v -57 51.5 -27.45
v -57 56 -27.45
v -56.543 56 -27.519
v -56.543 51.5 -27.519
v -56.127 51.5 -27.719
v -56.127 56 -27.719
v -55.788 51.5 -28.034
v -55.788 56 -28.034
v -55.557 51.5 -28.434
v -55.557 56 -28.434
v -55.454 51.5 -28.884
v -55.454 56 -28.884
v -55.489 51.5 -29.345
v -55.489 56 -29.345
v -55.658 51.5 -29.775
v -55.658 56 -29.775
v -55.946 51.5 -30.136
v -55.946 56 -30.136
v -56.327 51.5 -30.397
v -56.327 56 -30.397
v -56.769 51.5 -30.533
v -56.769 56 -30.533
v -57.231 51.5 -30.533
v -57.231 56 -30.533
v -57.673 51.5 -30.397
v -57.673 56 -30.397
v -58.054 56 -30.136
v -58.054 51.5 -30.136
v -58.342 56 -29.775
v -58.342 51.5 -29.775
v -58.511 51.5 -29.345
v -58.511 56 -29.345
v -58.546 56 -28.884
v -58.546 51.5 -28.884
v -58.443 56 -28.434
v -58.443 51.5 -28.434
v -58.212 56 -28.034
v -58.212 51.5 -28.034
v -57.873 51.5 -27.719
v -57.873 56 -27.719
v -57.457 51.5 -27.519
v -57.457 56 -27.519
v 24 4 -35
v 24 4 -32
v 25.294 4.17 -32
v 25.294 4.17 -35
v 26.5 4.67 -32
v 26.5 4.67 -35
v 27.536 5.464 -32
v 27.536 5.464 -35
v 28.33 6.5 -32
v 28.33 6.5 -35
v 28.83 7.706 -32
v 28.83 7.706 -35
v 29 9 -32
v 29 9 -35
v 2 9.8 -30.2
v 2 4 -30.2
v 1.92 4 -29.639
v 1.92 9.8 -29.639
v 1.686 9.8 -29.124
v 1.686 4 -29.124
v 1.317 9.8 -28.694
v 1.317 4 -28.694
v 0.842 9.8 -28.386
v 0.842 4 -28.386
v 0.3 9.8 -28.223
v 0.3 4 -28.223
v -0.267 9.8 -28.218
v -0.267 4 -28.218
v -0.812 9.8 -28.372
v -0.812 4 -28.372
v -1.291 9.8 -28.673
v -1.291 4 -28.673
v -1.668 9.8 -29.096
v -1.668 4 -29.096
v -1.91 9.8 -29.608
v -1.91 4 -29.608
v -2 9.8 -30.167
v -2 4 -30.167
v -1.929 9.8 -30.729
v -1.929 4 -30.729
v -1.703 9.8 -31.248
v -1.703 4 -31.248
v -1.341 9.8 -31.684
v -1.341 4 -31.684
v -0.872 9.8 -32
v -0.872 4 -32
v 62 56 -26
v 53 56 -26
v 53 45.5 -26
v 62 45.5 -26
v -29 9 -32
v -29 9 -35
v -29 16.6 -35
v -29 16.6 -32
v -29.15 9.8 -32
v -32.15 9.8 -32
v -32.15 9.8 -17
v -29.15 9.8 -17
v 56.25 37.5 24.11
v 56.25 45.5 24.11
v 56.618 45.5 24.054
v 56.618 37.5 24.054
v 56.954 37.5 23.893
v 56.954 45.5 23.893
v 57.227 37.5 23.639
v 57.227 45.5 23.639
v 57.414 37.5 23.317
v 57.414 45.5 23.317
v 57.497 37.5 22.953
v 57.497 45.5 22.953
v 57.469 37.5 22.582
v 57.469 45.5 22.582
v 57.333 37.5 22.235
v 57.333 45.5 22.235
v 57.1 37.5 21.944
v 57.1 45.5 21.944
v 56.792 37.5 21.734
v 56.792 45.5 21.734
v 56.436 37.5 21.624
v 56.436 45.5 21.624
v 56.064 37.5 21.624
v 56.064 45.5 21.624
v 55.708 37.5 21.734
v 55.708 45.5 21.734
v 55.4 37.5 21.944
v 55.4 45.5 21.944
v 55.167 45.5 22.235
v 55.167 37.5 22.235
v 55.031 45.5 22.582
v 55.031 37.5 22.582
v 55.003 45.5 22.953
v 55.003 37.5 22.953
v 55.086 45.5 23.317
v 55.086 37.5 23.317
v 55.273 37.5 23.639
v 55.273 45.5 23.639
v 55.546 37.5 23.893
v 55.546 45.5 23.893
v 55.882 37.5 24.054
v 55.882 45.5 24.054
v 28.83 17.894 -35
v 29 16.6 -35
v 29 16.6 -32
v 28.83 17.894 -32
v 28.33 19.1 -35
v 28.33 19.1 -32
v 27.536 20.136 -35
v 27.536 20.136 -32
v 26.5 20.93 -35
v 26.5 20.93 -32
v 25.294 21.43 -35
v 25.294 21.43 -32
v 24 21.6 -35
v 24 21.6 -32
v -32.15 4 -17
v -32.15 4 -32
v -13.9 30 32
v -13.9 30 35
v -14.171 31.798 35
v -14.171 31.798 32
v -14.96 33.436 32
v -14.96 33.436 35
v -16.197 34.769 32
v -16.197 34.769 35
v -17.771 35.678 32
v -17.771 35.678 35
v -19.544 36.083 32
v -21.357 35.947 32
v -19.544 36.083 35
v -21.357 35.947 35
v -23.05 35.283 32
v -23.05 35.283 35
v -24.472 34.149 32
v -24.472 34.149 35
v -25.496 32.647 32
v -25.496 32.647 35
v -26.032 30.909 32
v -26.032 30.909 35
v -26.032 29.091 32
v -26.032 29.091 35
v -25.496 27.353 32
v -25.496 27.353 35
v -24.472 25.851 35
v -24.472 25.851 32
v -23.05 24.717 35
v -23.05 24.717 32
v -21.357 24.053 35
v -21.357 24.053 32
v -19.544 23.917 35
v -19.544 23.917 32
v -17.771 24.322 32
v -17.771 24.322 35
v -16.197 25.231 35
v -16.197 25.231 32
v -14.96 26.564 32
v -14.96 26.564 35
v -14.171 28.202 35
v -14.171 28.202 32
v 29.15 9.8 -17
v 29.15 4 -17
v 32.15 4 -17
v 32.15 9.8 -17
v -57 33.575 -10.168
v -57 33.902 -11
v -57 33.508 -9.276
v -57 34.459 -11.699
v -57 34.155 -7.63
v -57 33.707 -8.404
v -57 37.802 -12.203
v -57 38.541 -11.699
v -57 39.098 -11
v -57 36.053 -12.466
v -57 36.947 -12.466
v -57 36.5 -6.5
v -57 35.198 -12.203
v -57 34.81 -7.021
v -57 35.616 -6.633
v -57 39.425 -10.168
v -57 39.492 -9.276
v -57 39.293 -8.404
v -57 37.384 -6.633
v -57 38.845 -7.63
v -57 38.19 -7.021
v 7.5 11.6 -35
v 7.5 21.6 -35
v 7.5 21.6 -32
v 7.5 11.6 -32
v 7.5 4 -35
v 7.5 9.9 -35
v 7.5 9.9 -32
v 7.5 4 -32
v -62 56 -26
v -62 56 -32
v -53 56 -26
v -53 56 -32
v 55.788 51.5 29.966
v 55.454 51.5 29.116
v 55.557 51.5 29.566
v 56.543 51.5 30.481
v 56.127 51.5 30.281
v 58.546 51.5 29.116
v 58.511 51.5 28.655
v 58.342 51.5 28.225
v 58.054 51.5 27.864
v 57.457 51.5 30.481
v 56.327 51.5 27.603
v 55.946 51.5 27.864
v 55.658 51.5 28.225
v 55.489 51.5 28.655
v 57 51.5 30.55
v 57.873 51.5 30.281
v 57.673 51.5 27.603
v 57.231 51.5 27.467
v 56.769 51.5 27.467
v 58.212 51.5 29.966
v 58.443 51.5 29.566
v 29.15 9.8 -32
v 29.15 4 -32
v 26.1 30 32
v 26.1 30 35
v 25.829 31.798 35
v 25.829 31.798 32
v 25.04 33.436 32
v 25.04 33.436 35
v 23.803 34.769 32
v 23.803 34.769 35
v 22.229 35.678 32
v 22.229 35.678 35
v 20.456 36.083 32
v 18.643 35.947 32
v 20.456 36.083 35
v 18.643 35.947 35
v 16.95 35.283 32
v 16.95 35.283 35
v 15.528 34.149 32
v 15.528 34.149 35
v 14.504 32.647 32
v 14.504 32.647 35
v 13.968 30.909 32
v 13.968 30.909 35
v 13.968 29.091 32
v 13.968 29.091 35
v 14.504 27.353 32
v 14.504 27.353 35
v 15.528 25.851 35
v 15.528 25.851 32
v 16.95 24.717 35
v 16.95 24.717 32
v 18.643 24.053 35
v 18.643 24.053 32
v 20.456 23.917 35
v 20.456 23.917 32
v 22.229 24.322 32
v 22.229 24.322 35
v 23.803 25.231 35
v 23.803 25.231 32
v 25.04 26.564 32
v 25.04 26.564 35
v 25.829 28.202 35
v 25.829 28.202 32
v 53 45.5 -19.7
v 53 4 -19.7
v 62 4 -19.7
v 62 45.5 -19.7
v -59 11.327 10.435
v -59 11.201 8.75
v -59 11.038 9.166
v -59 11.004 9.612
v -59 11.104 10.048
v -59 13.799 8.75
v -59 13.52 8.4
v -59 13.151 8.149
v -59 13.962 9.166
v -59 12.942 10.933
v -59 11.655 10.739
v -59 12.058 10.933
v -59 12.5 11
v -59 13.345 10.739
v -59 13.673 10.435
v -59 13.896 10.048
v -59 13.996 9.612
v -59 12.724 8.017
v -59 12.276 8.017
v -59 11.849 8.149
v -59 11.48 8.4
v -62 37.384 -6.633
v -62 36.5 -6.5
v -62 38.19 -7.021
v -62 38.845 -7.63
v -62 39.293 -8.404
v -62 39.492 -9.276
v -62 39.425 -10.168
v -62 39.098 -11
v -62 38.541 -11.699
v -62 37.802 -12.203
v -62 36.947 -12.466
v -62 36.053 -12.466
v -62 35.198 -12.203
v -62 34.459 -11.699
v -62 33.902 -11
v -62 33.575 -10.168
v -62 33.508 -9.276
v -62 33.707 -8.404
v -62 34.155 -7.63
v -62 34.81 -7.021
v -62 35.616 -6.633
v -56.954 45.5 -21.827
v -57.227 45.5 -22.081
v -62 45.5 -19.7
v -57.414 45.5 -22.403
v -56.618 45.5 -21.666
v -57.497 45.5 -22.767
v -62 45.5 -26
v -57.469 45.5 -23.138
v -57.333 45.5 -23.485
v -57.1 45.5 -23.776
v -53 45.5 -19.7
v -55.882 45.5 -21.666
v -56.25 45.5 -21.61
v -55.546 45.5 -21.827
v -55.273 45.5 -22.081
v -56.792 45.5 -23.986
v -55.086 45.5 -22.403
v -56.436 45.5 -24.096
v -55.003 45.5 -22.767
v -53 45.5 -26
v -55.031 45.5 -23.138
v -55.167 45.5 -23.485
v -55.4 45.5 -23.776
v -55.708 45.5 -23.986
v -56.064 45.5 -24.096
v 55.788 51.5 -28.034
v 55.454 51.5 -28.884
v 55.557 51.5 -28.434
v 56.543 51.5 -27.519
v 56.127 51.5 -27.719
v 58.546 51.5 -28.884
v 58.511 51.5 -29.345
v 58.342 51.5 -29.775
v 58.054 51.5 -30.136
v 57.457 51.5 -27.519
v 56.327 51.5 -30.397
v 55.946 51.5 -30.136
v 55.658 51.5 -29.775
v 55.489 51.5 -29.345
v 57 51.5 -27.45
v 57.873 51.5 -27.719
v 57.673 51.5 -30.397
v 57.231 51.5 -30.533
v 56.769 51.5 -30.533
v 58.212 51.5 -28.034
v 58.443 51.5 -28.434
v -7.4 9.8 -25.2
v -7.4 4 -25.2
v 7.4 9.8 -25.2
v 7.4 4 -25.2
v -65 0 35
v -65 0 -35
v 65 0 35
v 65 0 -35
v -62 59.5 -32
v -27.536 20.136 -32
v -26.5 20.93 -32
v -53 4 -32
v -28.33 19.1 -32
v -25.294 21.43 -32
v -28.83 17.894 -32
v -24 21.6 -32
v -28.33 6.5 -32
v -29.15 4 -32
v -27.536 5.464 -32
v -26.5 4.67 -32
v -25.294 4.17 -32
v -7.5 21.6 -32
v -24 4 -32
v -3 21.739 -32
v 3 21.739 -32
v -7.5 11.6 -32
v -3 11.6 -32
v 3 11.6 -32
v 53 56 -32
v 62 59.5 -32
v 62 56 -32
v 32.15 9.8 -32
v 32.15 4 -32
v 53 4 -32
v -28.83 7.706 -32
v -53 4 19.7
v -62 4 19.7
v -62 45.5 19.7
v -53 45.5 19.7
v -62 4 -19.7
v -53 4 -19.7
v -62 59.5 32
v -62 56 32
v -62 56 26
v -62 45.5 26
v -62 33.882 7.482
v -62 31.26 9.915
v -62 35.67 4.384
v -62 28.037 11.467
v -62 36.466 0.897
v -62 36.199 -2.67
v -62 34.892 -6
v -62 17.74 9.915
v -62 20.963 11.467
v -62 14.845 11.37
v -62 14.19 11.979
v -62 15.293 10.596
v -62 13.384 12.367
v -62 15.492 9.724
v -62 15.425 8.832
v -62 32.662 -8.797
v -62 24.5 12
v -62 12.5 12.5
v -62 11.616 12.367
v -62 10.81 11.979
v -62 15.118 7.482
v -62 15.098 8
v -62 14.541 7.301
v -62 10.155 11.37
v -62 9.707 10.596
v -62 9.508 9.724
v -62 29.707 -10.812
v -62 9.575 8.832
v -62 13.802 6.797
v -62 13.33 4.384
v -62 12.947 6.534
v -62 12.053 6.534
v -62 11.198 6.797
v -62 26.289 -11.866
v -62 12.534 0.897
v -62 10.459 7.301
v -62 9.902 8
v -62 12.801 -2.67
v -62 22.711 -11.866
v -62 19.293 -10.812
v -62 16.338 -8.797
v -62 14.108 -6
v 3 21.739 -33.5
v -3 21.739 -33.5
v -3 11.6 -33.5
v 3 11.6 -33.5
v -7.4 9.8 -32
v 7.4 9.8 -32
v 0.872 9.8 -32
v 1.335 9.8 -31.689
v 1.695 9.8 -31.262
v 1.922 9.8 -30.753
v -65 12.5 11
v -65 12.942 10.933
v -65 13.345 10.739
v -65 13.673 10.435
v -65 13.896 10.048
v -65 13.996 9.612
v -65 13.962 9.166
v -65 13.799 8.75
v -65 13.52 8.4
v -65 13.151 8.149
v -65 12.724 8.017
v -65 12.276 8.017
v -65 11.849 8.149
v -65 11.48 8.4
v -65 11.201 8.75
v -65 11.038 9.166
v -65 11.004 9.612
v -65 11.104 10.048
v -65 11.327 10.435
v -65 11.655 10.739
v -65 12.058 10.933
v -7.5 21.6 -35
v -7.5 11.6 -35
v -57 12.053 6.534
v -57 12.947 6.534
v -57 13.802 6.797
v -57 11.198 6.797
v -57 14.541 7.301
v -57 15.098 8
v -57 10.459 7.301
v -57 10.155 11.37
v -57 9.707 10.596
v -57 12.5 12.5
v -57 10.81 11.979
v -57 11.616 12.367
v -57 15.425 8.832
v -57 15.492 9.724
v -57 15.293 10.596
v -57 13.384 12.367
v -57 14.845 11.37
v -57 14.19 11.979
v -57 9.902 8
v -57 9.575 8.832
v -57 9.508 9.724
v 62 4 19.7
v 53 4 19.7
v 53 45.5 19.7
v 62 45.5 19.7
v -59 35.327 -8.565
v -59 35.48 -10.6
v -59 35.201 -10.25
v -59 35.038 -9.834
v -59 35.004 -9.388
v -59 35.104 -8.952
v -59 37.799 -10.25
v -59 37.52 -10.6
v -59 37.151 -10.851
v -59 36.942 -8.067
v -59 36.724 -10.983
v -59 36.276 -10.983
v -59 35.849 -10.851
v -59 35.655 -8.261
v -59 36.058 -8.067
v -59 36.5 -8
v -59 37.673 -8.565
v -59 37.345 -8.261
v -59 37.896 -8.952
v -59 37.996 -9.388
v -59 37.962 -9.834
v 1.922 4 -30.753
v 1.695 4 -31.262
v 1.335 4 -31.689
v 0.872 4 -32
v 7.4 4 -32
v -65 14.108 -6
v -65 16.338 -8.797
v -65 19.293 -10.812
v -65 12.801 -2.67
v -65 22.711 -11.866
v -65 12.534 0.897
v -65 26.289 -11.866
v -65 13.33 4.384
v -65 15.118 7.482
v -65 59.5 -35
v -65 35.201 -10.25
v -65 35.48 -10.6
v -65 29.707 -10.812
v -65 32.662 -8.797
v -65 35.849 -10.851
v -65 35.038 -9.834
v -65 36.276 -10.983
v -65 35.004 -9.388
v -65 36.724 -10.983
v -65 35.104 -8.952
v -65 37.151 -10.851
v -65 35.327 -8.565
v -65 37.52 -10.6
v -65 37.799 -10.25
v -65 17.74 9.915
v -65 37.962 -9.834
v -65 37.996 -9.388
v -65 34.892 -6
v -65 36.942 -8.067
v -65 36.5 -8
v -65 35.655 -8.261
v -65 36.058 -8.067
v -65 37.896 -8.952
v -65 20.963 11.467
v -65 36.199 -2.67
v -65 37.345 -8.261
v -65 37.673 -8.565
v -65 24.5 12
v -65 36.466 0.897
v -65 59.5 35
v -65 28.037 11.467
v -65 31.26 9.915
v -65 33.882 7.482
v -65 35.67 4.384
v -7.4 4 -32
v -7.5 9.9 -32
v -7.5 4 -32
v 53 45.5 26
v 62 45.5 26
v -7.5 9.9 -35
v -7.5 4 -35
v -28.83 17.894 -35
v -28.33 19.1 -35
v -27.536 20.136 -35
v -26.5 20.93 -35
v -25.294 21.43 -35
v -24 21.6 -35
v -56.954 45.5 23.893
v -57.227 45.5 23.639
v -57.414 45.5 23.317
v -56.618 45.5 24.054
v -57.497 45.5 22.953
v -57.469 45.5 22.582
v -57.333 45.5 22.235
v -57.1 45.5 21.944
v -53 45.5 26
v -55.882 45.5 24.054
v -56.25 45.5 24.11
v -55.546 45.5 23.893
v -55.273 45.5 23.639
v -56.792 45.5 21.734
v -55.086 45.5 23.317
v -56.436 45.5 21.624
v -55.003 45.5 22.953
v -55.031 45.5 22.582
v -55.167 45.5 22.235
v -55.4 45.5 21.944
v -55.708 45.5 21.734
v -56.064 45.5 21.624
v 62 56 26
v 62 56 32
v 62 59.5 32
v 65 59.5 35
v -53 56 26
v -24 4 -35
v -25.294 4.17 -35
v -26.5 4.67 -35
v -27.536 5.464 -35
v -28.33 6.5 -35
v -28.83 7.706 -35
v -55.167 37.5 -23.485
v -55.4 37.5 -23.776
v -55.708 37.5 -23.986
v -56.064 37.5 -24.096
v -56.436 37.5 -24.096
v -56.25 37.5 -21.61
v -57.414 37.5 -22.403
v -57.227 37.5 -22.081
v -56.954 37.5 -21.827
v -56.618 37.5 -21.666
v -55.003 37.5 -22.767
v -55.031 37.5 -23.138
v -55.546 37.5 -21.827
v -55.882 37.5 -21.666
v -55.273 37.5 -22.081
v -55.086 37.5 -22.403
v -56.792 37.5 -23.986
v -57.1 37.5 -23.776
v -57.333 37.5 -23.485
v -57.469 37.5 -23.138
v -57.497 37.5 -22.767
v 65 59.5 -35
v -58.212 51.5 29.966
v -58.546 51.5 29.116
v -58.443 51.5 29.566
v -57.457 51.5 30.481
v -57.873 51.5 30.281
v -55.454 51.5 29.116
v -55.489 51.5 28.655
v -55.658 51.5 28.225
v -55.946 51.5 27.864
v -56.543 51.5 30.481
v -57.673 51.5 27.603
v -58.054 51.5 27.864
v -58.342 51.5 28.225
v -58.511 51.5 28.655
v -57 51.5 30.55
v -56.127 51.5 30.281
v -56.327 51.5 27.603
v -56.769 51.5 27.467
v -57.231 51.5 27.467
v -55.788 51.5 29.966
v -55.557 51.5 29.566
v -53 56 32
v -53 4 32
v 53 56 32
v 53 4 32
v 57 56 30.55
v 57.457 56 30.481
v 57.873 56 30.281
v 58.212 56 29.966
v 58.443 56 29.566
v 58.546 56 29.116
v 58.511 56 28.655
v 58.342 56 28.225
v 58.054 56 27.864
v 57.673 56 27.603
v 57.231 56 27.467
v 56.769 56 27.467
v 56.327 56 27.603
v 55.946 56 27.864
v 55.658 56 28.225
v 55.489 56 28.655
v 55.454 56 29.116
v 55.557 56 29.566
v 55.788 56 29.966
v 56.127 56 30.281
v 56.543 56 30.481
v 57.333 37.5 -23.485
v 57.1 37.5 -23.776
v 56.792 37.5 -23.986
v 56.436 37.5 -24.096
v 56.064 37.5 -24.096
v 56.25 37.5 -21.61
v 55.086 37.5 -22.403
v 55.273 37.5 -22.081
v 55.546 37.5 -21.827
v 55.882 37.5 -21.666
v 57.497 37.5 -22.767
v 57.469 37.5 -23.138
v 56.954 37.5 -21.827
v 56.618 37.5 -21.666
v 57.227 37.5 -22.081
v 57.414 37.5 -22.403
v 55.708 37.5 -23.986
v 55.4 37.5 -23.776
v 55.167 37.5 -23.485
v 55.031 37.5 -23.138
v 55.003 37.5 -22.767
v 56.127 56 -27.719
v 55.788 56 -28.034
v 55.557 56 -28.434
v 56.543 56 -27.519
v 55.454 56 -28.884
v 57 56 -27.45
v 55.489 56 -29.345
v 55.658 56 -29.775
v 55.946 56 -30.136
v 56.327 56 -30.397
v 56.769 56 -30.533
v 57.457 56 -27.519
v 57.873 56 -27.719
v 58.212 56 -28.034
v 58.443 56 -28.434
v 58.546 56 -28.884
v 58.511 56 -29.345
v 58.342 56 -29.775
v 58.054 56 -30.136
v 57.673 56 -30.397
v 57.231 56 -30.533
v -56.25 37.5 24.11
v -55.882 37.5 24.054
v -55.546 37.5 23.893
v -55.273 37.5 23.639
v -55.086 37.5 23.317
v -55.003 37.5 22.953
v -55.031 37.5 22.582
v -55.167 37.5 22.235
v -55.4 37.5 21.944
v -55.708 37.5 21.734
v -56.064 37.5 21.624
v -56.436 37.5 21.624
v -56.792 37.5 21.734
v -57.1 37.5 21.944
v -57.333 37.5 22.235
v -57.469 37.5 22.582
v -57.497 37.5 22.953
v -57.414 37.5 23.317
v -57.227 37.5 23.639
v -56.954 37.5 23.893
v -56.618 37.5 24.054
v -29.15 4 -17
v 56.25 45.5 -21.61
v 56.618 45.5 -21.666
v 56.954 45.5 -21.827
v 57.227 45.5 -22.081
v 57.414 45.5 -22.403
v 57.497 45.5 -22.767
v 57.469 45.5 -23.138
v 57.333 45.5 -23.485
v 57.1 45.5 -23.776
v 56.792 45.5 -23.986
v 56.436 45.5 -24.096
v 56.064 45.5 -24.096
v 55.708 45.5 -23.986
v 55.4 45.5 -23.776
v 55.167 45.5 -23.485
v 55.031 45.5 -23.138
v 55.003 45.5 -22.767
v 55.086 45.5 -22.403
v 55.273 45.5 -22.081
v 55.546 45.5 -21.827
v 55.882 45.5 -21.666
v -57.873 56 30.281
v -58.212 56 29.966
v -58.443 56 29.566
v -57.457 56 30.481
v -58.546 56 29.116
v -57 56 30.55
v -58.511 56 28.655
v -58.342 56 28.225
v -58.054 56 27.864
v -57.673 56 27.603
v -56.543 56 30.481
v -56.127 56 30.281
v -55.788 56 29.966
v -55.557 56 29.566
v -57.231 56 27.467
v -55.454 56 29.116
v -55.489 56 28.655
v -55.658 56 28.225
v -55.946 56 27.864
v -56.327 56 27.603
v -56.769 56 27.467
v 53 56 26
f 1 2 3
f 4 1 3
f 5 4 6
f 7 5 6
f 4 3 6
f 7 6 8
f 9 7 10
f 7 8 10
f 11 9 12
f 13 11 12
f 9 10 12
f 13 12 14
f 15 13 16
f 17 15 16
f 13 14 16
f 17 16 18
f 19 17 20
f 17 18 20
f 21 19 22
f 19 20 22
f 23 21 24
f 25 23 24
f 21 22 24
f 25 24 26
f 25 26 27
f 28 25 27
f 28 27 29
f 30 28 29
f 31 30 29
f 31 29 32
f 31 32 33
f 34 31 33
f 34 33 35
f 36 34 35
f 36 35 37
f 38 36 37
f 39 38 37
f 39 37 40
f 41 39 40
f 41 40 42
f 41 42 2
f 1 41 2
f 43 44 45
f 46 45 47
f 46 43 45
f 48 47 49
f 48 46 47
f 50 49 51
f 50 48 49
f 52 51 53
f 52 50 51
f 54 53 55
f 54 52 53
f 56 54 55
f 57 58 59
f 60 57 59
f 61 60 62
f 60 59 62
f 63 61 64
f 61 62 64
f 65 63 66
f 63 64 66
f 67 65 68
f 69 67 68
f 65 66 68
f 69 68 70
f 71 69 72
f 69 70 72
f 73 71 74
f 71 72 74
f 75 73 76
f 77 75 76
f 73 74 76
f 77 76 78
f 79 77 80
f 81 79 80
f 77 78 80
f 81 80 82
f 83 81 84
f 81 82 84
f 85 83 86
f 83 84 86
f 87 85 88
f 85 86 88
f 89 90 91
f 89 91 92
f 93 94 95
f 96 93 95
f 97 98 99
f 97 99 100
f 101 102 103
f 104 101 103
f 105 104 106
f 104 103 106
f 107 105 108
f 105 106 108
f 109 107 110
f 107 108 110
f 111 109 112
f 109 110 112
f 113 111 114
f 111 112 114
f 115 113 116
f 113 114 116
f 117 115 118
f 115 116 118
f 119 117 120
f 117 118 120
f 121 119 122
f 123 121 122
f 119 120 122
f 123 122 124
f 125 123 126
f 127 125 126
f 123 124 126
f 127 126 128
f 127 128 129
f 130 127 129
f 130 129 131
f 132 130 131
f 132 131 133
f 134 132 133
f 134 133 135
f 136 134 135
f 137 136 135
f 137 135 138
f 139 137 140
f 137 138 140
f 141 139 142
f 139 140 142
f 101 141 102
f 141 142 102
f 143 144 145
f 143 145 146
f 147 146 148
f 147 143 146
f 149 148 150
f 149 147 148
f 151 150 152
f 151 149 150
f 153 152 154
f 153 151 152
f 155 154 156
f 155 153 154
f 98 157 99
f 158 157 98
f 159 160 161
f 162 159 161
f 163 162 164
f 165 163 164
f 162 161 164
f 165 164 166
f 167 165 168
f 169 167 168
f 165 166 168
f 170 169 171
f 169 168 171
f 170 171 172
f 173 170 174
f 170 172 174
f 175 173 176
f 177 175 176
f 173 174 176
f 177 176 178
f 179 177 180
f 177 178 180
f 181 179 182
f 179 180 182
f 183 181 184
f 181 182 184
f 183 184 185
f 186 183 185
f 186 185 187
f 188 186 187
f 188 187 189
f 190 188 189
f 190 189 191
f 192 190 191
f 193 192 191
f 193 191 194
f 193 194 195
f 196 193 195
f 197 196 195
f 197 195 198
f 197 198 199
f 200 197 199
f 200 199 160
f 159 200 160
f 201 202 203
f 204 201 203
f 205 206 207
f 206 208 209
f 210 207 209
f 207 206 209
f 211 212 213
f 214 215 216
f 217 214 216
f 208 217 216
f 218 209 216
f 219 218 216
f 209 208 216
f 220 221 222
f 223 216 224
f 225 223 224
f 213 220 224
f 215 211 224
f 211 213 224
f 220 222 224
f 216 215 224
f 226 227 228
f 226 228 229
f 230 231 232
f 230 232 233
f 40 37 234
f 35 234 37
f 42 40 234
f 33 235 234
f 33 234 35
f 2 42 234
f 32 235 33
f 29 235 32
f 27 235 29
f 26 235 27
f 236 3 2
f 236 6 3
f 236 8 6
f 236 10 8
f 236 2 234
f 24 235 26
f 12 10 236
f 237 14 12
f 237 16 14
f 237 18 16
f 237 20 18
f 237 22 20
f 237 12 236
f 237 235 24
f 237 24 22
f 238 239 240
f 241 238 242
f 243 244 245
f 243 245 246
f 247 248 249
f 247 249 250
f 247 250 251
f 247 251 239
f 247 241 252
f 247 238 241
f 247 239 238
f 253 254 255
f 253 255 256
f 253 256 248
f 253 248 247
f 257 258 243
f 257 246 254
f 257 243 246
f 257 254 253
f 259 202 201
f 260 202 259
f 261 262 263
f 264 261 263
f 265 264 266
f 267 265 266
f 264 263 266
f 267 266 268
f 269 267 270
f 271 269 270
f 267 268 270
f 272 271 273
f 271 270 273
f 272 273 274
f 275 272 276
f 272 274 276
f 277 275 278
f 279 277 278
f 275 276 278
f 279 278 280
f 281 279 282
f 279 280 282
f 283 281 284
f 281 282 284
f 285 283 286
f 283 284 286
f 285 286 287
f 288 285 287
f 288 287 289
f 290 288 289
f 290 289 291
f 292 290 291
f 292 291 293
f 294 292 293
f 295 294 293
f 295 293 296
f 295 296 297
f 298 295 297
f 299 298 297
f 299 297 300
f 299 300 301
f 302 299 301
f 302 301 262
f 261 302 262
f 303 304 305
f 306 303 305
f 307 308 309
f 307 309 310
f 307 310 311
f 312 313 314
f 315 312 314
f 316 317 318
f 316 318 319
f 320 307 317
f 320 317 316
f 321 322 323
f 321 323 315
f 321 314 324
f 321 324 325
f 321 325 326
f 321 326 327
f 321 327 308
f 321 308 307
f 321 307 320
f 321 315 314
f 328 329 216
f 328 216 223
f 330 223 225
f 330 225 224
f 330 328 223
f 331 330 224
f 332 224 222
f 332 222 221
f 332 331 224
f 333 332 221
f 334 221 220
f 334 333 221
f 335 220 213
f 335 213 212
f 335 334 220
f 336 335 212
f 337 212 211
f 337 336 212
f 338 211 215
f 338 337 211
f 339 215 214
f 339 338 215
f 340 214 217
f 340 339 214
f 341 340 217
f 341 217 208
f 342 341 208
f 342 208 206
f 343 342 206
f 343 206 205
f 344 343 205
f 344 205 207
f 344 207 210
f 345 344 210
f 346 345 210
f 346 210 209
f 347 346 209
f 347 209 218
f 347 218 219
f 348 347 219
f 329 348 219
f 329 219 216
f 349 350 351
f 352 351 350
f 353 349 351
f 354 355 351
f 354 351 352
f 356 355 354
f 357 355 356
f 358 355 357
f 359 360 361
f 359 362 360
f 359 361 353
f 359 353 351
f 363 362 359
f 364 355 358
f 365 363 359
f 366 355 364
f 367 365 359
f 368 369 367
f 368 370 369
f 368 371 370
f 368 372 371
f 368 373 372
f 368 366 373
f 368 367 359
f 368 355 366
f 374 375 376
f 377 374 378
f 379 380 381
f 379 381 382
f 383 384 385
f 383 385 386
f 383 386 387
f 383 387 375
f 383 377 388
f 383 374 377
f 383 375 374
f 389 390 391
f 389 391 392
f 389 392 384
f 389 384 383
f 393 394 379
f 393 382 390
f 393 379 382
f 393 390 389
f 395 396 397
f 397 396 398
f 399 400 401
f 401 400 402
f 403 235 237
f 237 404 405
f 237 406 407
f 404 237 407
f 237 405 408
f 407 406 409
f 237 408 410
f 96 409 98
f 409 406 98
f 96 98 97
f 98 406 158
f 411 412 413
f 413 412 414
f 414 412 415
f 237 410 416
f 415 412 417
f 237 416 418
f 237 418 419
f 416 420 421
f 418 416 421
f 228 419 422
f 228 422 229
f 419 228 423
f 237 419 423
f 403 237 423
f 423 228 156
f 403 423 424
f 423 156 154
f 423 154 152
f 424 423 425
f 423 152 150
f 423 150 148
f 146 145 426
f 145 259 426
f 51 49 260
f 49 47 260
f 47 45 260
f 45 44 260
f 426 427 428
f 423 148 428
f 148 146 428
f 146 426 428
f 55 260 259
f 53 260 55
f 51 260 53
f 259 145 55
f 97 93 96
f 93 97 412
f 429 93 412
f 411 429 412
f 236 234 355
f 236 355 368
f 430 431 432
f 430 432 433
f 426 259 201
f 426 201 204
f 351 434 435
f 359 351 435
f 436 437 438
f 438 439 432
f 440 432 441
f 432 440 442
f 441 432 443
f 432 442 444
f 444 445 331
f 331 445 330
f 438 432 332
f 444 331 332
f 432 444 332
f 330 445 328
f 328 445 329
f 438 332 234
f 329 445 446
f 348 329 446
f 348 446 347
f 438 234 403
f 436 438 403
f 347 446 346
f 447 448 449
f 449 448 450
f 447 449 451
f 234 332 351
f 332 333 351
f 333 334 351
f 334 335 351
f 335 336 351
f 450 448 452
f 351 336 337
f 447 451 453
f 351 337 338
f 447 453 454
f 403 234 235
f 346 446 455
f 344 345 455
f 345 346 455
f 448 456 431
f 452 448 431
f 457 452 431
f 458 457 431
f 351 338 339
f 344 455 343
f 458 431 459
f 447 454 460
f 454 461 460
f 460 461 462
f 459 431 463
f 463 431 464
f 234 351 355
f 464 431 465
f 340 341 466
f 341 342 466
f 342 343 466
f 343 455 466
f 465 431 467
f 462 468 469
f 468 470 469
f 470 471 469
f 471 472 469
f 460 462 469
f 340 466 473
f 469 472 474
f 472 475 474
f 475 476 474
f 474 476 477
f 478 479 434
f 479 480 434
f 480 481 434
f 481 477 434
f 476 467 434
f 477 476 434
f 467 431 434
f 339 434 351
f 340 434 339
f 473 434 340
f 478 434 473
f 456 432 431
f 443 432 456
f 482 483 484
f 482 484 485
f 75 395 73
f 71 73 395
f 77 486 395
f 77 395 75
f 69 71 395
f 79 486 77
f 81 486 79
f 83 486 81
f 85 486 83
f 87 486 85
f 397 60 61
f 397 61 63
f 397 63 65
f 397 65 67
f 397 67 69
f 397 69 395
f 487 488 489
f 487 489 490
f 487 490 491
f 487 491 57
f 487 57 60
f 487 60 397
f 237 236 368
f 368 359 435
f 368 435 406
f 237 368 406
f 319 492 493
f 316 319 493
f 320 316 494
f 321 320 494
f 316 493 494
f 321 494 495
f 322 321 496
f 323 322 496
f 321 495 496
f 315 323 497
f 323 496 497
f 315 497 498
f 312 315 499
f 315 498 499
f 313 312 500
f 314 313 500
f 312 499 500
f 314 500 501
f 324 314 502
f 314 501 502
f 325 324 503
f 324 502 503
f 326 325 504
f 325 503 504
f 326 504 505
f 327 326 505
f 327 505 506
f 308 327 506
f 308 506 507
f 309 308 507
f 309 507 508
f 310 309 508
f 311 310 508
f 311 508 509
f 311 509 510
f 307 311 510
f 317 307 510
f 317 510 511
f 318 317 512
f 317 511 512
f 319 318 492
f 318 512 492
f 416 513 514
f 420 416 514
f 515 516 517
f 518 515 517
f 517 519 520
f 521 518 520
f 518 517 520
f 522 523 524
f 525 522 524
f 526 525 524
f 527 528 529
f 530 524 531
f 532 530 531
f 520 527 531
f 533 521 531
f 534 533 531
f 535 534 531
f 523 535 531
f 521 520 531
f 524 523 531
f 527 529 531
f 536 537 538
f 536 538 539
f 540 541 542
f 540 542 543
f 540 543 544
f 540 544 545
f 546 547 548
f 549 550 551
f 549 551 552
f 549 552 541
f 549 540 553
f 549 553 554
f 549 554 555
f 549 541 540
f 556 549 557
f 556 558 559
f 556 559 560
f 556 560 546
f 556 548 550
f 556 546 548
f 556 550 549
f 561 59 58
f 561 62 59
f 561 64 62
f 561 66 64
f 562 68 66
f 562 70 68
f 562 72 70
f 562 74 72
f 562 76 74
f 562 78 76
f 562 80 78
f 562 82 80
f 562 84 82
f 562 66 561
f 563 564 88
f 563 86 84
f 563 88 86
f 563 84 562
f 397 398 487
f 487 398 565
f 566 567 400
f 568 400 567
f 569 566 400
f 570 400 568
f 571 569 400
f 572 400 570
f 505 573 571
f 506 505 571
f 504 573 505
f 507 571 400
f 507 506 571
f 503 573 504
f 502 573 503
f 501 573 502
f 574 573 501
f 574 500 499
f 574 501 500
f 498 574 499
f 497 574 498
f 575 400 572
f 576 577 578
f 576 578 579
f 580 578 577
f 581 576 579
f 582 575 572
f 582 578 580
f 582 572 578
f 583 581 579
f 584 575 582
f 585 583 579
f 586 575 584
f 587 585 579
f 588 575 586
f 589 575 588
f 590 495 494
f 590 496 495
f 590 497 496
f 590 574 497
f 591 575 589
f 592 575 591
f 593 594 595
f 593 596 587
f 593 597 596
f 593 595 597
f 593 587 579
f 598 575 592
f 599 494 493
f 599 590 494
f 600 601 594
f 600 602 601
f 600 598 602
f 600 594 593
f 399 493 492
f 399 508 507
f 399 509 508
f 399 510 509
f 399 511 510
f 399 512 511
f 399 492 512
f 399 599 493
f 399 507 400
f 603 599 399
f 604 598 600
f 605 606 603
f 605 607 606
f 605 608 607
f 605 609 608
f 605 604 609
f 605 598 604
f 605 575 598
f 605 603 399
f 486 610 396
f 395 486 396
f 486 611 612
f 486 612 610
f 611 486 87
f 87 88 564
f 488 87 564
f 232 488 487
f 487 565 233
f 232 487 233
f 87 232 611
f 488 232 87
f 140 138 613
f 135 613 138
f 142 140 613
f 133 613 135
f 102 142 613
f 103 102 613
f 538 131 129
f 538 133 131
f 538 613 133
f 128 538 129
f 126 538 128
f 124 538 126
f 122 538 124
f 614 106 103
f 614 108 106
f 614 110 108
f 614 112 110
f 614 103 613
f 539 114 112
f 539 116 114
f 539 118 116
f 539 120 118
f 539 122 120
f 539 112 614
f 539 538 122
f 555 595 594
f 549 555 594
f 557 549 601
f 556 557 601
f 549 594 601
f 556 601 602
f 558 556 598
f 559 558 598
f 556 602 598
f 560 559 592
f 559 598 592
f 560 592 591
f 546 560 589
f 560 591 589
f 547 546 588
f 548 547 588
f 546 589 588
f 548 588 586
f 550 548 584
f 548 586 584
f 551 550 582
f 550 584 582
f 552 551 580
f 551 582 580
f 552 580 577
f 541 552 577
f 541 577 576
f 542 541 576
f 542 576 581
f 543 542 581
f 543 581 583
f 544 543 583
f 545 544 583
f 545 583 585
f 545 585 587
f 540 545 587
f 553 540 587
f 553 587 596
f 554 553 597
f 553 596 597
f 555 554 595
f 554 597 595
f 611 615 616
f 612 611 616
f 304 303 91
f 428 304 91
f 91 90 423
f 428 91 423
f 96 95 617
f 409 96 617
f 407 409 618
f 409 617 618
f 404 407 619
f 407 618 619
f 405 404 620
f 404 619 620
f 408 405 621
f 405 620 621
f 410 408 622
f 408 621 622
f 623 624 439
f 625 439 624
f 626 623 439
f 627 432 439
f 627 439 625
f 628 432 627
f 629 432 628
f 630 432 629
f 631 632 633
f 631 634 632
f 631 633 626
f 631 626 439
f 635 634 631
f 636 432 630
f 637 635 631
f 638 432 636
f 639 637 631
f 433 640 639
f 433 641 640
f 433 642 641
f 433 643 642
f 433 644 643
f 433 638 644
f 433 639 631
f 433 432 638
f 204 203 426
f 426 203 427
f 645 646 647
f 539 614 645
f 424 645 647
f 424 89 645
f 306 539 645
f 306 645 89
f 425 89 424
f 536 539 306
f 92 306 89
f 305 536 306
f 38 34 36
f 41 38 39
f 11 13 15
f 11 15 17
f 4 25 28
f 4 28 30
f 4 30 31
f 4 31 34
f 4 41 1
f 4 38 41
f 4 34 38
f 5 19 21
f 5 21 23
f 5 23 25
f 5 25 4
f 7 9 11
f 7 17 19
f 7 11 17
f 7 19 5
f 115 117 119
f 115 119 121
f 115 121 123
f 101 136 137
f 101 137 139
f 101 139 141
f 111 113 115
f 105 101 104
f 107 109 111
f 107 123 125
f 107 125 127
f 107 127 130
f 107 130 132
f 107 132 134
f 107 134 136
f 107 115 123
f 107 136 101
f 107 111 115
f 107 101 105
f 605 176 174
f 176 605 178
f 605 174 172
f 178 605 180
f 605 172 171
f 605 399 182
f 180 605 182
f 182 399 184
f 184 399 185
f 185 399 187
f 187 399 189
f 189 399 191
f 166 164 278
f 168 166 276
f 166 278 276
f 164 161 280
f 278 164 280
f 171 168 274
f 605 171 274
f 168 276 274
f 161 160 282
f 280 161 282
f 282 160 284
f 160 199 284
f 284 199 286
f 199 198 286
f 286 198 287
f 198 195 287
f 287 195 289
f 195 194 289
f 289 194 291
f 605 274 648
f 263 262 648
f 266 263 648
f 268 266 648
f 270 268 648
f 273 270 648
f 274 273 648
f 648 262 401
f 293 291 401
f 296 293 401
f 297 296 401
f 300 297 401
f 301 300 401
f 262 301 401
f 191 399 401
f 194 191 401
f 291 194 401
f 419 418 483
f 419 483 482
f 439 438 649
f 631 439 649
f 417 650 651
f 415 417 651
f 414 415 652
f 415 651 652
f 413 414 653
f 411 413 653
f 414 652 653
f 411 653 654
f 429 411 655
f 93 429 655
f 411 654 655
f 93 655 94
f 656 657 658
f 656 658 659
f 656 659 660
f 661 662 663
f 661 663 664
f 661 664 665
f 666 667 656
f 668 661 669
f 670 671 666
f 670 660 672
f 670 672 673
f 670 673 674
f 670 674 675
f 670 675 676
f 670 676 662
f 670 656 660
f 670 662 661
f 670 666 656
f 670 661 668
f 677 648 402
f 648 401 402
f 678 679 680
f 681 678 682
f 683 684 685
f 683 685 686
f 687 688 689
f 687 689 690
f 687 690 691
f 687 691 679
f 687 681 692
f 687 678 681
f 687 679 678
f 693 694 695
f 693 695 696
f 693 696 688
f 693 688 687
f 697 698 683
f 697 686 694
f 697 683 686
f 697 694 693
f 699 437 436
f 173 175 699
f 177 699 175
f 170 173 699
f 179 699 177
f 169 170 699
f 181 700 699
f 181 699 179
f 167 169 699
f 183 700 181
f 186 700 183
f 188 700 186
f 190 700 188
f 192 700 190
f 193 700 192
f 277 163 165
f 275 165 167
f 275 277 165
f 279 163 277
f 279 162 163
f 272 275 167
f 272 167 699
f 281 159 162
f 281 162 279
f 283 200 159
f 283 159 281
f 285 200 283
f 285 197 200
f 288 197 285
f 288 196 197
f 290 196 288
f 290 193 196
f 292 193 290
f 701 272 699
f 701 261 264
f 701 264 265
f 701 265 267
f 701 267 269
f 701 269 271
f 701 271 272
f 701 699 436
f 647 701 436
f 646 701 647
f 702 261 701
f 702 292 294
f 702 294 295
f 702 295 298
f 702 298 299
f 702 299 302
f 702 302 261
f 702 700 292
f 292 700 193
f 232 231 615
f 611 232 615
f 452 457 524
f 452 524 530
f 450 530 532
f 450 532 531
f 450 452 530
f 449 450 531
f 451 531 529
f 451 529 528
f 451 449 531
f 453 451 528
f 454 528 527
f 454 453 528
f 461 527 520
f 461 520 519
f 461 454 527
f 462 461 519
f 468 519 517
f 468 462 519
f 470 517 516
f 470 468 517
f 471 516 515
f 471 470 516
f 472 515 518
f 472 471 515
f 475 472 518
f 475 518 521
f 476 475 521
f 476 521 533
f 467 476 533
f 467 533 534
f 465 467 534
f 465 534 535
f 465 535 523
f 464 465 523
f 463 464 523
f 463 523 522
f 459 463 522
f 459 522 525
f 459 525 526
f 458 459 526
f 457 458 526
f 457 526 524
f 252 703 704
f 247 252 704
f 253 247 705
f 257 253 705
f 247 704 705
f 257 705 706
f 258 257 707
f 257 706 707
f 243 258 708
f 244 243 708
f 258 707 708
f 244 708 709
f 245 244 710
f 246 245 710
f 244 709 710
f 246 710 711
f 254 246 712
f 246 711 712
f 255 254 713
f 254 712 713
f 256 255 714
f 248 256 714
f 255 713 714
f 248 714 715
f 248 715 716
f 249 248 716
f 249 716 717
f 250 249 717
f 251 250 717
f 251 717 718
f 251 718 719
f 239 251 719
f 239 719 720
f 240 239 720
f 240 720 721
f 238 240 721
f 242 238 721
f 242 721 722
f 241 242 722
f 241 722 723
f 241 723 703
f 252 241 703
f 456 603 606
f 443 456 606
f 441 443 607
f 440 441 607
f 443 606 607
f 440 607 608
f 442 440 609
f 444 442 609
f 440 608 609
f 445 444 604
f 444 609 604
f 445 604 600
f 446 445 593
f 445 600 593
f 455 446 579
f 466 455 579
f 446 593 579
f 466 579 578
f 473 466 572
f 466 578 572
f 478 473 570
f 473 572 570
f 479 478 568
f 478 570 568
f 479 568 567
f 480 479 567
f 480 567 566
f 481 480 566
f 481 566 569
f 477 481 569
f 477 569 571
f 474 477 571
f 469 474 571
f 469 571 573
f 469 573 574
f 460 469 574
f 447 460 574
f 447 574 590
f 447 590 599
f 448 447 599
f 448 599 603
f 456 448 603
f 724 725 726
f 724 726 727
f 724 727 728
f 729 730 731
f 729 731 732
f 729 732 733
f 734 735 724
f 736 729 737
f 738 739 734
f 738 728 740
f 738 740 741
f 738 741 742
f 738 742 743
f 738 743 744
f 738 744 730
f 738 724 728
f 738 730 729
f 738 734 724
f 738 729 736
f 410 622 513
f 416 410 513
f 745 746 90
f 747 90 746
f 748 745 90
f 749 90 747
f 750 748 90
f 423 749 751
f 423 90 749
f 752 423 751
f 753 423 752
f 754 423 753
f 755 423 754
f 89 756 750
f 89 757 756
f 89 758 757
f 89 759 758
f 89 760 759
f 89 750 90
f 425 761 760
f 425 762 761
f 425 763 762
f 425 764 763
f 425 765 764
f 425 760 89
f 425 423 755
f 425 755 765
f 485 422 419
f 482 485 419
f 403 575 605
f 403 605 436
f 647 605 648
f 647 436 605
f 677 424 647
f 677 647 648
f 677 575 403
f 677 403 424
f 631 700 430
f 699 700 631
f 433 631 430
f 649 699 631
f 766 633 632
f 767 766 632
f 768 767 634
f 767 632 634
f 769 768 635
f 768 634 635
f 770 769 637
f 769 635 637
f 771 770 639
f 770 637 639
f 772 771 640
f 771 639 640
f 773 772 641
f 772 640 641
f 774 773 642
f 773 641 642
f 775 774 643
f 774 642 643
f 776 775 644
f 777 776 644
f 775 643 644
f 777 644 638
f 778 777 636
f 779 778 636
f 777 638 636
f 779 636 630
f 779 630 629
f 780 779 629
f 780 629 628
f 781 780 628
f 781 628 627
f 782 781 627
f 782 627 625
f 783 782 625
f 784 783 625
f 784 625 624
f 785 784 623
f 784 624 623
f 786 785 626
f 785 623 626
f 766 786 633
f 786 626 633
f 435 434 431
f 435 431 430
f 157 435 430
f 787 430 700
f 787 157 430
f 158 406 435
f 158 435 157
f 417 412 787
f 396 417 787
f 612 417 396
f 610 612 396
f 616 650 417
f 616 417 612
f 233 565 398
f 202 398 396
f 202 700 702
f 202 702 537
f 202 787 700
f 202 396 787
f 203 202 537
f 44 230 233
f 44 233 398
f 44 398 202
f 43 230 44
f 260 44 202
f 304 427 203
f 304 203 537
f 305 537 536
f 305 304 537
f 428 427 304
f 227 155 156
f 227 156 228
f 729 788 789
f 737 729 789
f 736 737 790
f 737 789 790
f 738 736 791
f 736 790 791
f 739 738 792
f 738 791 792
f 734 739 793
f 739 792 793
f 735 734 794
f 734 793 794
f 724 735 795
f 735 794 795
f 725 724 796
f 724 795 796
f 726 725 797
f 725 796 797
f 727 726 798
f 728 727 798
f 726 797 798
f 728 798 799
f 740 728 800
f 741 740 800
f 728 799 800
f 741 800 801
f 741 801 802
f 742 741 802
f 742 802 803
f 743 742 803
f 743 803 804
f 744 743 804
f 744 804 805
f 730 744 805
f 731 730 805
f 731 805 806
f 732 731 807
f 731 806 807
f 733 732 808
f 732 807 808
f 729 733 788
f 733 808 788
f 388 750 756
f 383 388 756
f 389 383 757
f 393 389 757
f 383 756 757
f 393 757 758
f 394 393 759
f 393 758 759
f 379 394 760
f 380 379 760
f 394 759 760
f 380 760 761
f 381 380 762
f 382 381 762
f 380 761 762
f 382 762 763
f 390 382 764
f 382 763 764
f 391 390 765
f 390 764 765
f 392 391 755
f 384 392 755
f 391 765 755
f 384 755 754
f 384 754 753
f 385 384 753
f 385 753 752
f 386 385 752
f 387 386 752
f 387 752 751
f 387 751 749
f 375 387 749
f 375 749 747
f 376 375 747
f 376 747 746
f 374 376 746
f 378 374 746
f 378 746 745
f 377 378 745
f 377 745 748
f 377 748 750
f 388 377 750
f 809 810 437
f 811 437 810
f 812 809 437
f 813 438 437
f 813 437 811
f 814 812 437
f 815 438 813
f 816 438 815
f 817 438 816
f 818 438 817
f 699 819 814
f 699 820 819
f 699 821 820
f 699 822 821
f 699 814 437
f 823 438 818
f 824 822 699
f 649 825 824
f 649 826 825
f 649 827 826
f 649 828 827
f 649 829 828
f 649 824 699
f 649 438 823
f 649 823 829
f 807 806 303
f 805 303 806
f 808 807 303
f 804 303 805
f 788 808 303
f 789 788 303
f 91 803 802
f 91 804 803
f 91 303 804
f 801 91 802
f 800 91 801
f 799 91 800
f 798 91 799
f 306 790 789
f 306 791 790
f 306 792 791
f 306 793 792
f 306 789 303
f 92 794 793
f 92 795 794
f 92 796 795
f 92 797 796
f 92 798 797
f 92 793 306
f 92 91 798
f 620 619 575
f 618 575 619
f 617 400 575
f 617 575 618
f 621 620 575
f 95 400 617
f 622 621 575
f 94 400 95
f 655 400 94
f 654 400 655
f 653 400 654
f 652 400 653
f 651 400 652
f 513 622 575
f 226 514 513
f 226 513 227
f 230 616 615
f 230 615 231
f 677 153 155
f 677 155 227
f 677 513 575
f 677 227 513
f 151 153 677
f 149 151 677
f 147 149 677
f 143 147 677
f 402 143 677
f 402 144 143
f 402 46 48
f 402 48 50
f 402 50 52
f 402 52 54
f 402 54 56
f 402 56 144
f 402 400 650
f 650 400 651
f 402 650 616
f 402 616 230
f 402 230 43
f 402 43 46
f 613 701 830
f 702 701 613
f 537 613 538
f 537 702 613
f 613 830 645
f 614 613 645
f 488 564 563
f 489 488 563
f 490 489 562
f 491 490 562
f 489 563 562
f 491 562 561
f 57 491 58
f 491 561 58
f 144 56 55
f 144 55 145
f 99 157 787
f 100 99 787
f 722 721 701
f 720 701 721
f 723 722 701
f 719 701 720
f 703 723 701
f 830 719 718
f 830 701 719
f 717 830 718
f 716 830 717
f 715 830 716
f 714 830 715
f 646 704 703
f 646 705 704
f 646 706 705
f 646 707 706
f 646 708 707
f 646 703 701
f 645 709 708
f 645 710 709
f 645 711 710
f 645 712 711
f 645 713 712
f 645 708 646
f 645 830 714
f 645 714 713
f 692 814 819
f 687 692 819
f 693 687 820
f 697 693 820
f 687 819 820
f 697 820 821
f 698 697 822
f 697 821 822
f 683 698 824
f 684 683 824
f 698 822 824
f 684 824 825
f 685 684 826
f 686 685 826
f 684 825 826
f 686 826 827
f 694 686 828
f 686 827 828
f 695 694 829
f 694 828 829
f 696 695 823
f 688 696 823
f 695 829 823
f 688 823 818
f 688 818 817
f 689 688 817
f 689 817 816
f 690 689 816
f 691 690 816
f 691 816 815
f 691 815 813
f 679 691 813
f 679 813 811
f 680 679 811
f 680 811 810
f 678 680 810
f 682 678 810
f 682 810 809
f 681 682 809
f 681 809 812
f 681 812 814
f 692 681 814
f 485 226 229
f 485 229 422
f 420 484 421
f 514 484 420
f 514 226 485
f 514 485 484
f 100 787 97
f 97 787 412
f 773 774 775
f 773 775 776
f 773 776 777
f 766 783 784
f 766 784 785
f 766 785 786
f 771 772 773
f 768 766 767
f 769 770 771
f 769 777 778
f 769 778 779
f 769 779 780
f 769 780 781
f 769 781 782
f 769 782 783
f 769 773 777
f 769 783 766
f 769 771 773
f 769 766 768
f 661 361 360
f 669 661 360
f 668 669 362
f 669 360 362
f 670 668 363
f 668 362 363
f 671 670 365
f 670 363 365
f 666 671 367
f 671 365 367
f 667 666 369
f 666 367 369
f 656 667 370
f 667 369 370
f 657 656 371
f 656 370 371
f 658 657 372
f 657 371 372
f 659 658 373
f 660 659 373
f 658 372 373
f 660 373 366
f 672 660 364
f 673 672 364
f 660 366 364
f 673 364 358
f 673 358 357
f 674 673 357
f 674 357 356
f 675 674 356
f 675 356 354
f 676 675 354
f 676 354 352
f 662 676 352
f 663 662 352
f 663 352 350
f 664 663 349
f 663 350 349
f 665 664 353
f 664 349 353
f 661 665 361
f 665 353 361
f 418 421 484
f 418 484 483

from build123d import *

# Parameters (mm, degrees)
SKETCH1_W       = 130
SKETCH1_H       = 70
EXTRUDE1_DEPTH  = 4
SKETCH2_W       = 130
SKETCH2_H       = 70
SKETCH2_W_2     = 124
SKETCH2_H_2     = 64
EXTRUDE2_DEPTH  = 55.5
SKETCH3_W       = 15
SKETCH3_H       = 1.7
EXTRUDE3_DEPTH  = 4.8
SKETCH4_W       = 3
SKETCH4_H       = 15
EXTRUDE5_DEPTH  = 5.8
SKETCH5_W       = 6
SKETCH5_H       = 10.139345217
EXTRUDE6_DEPTH  = 1.5
SKETCH22_R      = 3
EXTRUDE26_DEPTH = 8
SKETCH10_R      = 12
SKETCH10_R_2    = 1.5
EXTRUDE11_DEPTH = 6
EXTRUDE13_START = -3.5
SKETCH12_W      = 9
SKETCH12_H      = 6
EXTRUDE13_DEPTH = 52
EXTRUDE14_START = -3.5
SKETCH13_W      = 9
SKETCH13_H      = 6
EXTRUDE14_DEPTH = 52
SKETCH14_R      = 1.55
EXTRUDE15_DEPTH = 8
SKETCH20_R      = 1.55
EXTRUDE22_DEPTH = 8
SKETCH23_W      = 9
SKETCH23_H      = 6.3
EXTRUDE27_DEPTH = 41.5
SKETCH24_R      = 6.1
EXTRUDE28_DEPTH = 5
SKETCH25_R      = 1.25
EXTRUDE29_DEPTH = 8


with BuildPart() as part:
    # Sketch1 → Extrude1 (new body)
    with BuildSketch(Plane(origin=(0, 0, 0), x_dir=(1, 0, 0), z_dir=(0, 1, 0))):
        Rectangle(SKETCH1_W, SKETCH1_H)
    extrude(amount=EXTRUDE1_DEPTH)

    # Sketch2 → Extrude2 (add)
    with BuildSketch(Plane(origin=(0, 4, 0), x_dir=(1, 0, 0), z_dir=(0, 1, 0))):
        Rectangle(SKETCH2_W, SKETCH2_H)
        Rectangle(SKETCH2_W_2, SKETCH2_H_2, mode=Mode.SUBTRACT)
    extrude(amount=EXTRUDE2_DEPTH)

    # Sketch3 → Extrude3 (cut)
    with BuildSketch(Plane(origin=(0, 0, -35), x_dir=(-1, 0, 0), z_dir=(0, 0, -1))):
        with BuildLine():
            Line((-24, 21.6), (-7.5, 21.6))
            Line((-7.5, 21.6), (-7.5, 4))
            Line((-7.5, 4), (-24, 4))
            ThreePointArc((-24, 4), (-27.535533906, 5.464466094), (-29, 9))
            Line((-29, 9), (-29, 16.6))
            ThreePointArc((-29, 16.6), (-27.535533906, 20.135533906), (-24, 21.6))
        make_face()
        with BuildLine():
            Line((7.5, 4), (24, 4))
            ThreePointArc((24, 4), (27.535533906, 5.464466094), (29, 9))
            Line((29, 9), (29, 16.6))
            ThreePointArc((29, 16.6), (27.535533906, 20.135533906), (24, 21.6))
            Line((24, 21.6), (7.5, 21.6))
            Line((7.5, 21.6), (7.5, 4))
        make_face()
        with Locations((0, 10.75)):
            Rectangle(SKETCH3_W, SKETCH3_H)
    extrude(amount=-EXTRUDE3_DEPTH, mode=Mode.SUBTRACT)

    # Sketch4 → Extrude5 (add)
    with BuildSketch(Plane(origin=(0, 4, 0), x_dir=(1, 0, 0), z_dir=(0, 1, 0))):
        with BuildLine():
            Line((-0.871779789, 32), (-7.4, 32))
            Line((-7.4, 32), (-7.4, 25.2))
            Line((-7.4, 25.2), (7.4, 25.2))
            Line((7.4, 25.2), (7.4, 32))
            Line((7.4, 32), (0.871779789, 32))
            ThreePointArc((0.871779789, 32), (1.694632641, 31.262177109), (2, 30.2))
            ThreePointArc((2, 30.2), (-1.062177109, 28.505367359), (-0.871779789, 32))
        make_face()
        with Locations((-30.65, 24.5)):
            Rectangle(SKETCH4_W, SKETCH4_H)
        with Locations((30.65, 24.5)):
            Rectangle(SKETCH4_W, SKETCH4_H)
    extrude(amount=EXTRUDE5_DEPTH)

    # Sketch5 → Extrude6 (cut)
    with BuildSketch(Plane.XY.offset(-32)):
        with Locations((0, 16.669672609)):
            Rectangle(SKETCH5_W, SKETCH5_H)
    extrude(amount=-EXTRUDE6_DEPTH, mode=Mode.SUBTRACT)

    # Sketch22 → Extrude26 (add)
    with BuildSketch(Plane.ZY.offset(65)):
        with Locations((-9.5, 36.5)):
            Circle(SKETCH22_R)
        with Locations((9.5, 12.5)):
            Circle(SKETCH22_R)
    extrude(amount=-EXTRUDE26_DEPTH)

    # Sketch10 → Extrude11 (cut)
    with BuildSketch(Plane.ZY.offset(65)):
        with Locations((0, 24.5)):
            Circle(SKETCH10_R)
        with Locations((-9.5, 36.5)):
            Circle(SKETCH10_R_2)
        with Locations((9.5, 12.5)):
            Circle(SKETCH10_R_2)
    extrude(amount=-EXTRUDE11_DEPTH, mode=Mode.SUBTRACT)

    # Sketch12 → Extrude13 (add)
    with BuildSketch(Plane(origin=(0, 59.5, 0), x_dir=(1, 0, 0), z_dir=(0, 1, 0)).offset(EXTRUDE13_START)):
        with Locations((-57.5, -29)):
            Rectangle(SKETCH12_W, SKETCH12_H)
        with Locations((57.5, -29)):
            Rectangle(SKETCH12_W, SKETCH12_H)
    extrude(amount=-EXTRUDE13_DEPTH)

    # Sketch13 → Extrude14 (add)
    with BuildSketch(Plane(origin=(0, 59.5, 0), x_dir=(1, 0, 0), z_dir=(0, 1, 0)).offset(EXTRUDE14_START)):
        with Locations((-57.5, 29)):
            Rectangle(SKETCH13_W, SKETCH13_H)
        with Locations((57.5, 29)):
            Rectangle(SKETCH13_W, SKETCH13_H)
    extrude(amount=-EXTRUDE14_DEPTH)

    # Sketch14 → Extrude15 (cut)
    with BuildSketch(Plane(origin=(0, 59.5, 0), x_dir=(1, 0, 0), z_dir=(0, 1, 0))):
        with Locations(Location((-57, 29, 0), (0, 0, 270))):
            Circle(SKETCH14_R)
        with Locations(Location((57, 29, 0), (0, 0, 270))):
            Circle(SKETCH14_R)
    extrude(amount=-EXTRUDE15_DEPTH, mode=Mode.SUBTRACT)

    # Sketch20 → Extrude22 (cut)
    with BuildSketch(Plane(origin=(0, 59.5, 0), x_dir=(1, 0, 0), z_dir=(0, 1, 0))):
        with Locations(Location((-57, -29, 0), (0, 0, 270))):
            Circle(SKETCH20_R)
        with Locations(Location((57, -29, 0), (0, 0, 270))):
            Circle(SKETCH20_R)
    extrude(amount=-EXTRUDE22_DEPTH, mode=Mode.SUBTRACT)

    # Sketch23 → Extrude27 (add)
    with BuildSketch(Plane(origin=(0, 4, 0), x_dir=(1, 0, 0), z_dir=(0, 1, 0))):
        with Locations((-57.5, 22.85)):
            Rectangle(SKETCH23_W, SKETCH23_H)
        with Locations((-57.5, -22.85)):
            Rectangle(SKETCH23_W, SKETCH23_H)
        with Locations((57.5, -22.85)):
            Rectangle(SKETCH23_W, SKETCH23_H)
        with Locations((57.5, 22.85)):
            Rectangle(SKETCH23_W, SKETCH23_H)
    extrude(amount=EXTRUDE27_DEPTH)

    # Sketch24 → Extrude28 (cut)
    with BuildSketch(Plane.XY.offset(35)):
        with Locations((-20, 30)):
            Circle(SKETCH24_R)
        with Locations((20, 30)):
            Circle(SKETCH24_R)
    extrude(amount=-EXTRUDE28_DEPTH, mode=Mode.SUBTRACT)

    # Sketch25 → Extrude29 (cut)
    with BuildSketch(Plane(origin=(0, 45.5, 0), x_dir=(1, 0, 0), z_dir=(0, 1, 0))):
        with Locations(Location((-56.25, 22.86, 0), (0, 0, 270))):
            Circle(SKETCH25_R)
        with Locations(Location((56.25, 22.86, 0), (0, 0, 270))):
            Circle(SKETCH25_R)
        with Locations(Location((-56.25, -22.86, 0), (0, 0, 270))):
            Circle(SKETCH25_R)
        with Locations(Location((56.25, -22.86, 0), (0, 0, 270))):
            Circle(SKETCH25_R)
    extrude(amount=-EXTRUDE29_DEPTH, mode=Mode.SUBTRACT)


solid = part.part
